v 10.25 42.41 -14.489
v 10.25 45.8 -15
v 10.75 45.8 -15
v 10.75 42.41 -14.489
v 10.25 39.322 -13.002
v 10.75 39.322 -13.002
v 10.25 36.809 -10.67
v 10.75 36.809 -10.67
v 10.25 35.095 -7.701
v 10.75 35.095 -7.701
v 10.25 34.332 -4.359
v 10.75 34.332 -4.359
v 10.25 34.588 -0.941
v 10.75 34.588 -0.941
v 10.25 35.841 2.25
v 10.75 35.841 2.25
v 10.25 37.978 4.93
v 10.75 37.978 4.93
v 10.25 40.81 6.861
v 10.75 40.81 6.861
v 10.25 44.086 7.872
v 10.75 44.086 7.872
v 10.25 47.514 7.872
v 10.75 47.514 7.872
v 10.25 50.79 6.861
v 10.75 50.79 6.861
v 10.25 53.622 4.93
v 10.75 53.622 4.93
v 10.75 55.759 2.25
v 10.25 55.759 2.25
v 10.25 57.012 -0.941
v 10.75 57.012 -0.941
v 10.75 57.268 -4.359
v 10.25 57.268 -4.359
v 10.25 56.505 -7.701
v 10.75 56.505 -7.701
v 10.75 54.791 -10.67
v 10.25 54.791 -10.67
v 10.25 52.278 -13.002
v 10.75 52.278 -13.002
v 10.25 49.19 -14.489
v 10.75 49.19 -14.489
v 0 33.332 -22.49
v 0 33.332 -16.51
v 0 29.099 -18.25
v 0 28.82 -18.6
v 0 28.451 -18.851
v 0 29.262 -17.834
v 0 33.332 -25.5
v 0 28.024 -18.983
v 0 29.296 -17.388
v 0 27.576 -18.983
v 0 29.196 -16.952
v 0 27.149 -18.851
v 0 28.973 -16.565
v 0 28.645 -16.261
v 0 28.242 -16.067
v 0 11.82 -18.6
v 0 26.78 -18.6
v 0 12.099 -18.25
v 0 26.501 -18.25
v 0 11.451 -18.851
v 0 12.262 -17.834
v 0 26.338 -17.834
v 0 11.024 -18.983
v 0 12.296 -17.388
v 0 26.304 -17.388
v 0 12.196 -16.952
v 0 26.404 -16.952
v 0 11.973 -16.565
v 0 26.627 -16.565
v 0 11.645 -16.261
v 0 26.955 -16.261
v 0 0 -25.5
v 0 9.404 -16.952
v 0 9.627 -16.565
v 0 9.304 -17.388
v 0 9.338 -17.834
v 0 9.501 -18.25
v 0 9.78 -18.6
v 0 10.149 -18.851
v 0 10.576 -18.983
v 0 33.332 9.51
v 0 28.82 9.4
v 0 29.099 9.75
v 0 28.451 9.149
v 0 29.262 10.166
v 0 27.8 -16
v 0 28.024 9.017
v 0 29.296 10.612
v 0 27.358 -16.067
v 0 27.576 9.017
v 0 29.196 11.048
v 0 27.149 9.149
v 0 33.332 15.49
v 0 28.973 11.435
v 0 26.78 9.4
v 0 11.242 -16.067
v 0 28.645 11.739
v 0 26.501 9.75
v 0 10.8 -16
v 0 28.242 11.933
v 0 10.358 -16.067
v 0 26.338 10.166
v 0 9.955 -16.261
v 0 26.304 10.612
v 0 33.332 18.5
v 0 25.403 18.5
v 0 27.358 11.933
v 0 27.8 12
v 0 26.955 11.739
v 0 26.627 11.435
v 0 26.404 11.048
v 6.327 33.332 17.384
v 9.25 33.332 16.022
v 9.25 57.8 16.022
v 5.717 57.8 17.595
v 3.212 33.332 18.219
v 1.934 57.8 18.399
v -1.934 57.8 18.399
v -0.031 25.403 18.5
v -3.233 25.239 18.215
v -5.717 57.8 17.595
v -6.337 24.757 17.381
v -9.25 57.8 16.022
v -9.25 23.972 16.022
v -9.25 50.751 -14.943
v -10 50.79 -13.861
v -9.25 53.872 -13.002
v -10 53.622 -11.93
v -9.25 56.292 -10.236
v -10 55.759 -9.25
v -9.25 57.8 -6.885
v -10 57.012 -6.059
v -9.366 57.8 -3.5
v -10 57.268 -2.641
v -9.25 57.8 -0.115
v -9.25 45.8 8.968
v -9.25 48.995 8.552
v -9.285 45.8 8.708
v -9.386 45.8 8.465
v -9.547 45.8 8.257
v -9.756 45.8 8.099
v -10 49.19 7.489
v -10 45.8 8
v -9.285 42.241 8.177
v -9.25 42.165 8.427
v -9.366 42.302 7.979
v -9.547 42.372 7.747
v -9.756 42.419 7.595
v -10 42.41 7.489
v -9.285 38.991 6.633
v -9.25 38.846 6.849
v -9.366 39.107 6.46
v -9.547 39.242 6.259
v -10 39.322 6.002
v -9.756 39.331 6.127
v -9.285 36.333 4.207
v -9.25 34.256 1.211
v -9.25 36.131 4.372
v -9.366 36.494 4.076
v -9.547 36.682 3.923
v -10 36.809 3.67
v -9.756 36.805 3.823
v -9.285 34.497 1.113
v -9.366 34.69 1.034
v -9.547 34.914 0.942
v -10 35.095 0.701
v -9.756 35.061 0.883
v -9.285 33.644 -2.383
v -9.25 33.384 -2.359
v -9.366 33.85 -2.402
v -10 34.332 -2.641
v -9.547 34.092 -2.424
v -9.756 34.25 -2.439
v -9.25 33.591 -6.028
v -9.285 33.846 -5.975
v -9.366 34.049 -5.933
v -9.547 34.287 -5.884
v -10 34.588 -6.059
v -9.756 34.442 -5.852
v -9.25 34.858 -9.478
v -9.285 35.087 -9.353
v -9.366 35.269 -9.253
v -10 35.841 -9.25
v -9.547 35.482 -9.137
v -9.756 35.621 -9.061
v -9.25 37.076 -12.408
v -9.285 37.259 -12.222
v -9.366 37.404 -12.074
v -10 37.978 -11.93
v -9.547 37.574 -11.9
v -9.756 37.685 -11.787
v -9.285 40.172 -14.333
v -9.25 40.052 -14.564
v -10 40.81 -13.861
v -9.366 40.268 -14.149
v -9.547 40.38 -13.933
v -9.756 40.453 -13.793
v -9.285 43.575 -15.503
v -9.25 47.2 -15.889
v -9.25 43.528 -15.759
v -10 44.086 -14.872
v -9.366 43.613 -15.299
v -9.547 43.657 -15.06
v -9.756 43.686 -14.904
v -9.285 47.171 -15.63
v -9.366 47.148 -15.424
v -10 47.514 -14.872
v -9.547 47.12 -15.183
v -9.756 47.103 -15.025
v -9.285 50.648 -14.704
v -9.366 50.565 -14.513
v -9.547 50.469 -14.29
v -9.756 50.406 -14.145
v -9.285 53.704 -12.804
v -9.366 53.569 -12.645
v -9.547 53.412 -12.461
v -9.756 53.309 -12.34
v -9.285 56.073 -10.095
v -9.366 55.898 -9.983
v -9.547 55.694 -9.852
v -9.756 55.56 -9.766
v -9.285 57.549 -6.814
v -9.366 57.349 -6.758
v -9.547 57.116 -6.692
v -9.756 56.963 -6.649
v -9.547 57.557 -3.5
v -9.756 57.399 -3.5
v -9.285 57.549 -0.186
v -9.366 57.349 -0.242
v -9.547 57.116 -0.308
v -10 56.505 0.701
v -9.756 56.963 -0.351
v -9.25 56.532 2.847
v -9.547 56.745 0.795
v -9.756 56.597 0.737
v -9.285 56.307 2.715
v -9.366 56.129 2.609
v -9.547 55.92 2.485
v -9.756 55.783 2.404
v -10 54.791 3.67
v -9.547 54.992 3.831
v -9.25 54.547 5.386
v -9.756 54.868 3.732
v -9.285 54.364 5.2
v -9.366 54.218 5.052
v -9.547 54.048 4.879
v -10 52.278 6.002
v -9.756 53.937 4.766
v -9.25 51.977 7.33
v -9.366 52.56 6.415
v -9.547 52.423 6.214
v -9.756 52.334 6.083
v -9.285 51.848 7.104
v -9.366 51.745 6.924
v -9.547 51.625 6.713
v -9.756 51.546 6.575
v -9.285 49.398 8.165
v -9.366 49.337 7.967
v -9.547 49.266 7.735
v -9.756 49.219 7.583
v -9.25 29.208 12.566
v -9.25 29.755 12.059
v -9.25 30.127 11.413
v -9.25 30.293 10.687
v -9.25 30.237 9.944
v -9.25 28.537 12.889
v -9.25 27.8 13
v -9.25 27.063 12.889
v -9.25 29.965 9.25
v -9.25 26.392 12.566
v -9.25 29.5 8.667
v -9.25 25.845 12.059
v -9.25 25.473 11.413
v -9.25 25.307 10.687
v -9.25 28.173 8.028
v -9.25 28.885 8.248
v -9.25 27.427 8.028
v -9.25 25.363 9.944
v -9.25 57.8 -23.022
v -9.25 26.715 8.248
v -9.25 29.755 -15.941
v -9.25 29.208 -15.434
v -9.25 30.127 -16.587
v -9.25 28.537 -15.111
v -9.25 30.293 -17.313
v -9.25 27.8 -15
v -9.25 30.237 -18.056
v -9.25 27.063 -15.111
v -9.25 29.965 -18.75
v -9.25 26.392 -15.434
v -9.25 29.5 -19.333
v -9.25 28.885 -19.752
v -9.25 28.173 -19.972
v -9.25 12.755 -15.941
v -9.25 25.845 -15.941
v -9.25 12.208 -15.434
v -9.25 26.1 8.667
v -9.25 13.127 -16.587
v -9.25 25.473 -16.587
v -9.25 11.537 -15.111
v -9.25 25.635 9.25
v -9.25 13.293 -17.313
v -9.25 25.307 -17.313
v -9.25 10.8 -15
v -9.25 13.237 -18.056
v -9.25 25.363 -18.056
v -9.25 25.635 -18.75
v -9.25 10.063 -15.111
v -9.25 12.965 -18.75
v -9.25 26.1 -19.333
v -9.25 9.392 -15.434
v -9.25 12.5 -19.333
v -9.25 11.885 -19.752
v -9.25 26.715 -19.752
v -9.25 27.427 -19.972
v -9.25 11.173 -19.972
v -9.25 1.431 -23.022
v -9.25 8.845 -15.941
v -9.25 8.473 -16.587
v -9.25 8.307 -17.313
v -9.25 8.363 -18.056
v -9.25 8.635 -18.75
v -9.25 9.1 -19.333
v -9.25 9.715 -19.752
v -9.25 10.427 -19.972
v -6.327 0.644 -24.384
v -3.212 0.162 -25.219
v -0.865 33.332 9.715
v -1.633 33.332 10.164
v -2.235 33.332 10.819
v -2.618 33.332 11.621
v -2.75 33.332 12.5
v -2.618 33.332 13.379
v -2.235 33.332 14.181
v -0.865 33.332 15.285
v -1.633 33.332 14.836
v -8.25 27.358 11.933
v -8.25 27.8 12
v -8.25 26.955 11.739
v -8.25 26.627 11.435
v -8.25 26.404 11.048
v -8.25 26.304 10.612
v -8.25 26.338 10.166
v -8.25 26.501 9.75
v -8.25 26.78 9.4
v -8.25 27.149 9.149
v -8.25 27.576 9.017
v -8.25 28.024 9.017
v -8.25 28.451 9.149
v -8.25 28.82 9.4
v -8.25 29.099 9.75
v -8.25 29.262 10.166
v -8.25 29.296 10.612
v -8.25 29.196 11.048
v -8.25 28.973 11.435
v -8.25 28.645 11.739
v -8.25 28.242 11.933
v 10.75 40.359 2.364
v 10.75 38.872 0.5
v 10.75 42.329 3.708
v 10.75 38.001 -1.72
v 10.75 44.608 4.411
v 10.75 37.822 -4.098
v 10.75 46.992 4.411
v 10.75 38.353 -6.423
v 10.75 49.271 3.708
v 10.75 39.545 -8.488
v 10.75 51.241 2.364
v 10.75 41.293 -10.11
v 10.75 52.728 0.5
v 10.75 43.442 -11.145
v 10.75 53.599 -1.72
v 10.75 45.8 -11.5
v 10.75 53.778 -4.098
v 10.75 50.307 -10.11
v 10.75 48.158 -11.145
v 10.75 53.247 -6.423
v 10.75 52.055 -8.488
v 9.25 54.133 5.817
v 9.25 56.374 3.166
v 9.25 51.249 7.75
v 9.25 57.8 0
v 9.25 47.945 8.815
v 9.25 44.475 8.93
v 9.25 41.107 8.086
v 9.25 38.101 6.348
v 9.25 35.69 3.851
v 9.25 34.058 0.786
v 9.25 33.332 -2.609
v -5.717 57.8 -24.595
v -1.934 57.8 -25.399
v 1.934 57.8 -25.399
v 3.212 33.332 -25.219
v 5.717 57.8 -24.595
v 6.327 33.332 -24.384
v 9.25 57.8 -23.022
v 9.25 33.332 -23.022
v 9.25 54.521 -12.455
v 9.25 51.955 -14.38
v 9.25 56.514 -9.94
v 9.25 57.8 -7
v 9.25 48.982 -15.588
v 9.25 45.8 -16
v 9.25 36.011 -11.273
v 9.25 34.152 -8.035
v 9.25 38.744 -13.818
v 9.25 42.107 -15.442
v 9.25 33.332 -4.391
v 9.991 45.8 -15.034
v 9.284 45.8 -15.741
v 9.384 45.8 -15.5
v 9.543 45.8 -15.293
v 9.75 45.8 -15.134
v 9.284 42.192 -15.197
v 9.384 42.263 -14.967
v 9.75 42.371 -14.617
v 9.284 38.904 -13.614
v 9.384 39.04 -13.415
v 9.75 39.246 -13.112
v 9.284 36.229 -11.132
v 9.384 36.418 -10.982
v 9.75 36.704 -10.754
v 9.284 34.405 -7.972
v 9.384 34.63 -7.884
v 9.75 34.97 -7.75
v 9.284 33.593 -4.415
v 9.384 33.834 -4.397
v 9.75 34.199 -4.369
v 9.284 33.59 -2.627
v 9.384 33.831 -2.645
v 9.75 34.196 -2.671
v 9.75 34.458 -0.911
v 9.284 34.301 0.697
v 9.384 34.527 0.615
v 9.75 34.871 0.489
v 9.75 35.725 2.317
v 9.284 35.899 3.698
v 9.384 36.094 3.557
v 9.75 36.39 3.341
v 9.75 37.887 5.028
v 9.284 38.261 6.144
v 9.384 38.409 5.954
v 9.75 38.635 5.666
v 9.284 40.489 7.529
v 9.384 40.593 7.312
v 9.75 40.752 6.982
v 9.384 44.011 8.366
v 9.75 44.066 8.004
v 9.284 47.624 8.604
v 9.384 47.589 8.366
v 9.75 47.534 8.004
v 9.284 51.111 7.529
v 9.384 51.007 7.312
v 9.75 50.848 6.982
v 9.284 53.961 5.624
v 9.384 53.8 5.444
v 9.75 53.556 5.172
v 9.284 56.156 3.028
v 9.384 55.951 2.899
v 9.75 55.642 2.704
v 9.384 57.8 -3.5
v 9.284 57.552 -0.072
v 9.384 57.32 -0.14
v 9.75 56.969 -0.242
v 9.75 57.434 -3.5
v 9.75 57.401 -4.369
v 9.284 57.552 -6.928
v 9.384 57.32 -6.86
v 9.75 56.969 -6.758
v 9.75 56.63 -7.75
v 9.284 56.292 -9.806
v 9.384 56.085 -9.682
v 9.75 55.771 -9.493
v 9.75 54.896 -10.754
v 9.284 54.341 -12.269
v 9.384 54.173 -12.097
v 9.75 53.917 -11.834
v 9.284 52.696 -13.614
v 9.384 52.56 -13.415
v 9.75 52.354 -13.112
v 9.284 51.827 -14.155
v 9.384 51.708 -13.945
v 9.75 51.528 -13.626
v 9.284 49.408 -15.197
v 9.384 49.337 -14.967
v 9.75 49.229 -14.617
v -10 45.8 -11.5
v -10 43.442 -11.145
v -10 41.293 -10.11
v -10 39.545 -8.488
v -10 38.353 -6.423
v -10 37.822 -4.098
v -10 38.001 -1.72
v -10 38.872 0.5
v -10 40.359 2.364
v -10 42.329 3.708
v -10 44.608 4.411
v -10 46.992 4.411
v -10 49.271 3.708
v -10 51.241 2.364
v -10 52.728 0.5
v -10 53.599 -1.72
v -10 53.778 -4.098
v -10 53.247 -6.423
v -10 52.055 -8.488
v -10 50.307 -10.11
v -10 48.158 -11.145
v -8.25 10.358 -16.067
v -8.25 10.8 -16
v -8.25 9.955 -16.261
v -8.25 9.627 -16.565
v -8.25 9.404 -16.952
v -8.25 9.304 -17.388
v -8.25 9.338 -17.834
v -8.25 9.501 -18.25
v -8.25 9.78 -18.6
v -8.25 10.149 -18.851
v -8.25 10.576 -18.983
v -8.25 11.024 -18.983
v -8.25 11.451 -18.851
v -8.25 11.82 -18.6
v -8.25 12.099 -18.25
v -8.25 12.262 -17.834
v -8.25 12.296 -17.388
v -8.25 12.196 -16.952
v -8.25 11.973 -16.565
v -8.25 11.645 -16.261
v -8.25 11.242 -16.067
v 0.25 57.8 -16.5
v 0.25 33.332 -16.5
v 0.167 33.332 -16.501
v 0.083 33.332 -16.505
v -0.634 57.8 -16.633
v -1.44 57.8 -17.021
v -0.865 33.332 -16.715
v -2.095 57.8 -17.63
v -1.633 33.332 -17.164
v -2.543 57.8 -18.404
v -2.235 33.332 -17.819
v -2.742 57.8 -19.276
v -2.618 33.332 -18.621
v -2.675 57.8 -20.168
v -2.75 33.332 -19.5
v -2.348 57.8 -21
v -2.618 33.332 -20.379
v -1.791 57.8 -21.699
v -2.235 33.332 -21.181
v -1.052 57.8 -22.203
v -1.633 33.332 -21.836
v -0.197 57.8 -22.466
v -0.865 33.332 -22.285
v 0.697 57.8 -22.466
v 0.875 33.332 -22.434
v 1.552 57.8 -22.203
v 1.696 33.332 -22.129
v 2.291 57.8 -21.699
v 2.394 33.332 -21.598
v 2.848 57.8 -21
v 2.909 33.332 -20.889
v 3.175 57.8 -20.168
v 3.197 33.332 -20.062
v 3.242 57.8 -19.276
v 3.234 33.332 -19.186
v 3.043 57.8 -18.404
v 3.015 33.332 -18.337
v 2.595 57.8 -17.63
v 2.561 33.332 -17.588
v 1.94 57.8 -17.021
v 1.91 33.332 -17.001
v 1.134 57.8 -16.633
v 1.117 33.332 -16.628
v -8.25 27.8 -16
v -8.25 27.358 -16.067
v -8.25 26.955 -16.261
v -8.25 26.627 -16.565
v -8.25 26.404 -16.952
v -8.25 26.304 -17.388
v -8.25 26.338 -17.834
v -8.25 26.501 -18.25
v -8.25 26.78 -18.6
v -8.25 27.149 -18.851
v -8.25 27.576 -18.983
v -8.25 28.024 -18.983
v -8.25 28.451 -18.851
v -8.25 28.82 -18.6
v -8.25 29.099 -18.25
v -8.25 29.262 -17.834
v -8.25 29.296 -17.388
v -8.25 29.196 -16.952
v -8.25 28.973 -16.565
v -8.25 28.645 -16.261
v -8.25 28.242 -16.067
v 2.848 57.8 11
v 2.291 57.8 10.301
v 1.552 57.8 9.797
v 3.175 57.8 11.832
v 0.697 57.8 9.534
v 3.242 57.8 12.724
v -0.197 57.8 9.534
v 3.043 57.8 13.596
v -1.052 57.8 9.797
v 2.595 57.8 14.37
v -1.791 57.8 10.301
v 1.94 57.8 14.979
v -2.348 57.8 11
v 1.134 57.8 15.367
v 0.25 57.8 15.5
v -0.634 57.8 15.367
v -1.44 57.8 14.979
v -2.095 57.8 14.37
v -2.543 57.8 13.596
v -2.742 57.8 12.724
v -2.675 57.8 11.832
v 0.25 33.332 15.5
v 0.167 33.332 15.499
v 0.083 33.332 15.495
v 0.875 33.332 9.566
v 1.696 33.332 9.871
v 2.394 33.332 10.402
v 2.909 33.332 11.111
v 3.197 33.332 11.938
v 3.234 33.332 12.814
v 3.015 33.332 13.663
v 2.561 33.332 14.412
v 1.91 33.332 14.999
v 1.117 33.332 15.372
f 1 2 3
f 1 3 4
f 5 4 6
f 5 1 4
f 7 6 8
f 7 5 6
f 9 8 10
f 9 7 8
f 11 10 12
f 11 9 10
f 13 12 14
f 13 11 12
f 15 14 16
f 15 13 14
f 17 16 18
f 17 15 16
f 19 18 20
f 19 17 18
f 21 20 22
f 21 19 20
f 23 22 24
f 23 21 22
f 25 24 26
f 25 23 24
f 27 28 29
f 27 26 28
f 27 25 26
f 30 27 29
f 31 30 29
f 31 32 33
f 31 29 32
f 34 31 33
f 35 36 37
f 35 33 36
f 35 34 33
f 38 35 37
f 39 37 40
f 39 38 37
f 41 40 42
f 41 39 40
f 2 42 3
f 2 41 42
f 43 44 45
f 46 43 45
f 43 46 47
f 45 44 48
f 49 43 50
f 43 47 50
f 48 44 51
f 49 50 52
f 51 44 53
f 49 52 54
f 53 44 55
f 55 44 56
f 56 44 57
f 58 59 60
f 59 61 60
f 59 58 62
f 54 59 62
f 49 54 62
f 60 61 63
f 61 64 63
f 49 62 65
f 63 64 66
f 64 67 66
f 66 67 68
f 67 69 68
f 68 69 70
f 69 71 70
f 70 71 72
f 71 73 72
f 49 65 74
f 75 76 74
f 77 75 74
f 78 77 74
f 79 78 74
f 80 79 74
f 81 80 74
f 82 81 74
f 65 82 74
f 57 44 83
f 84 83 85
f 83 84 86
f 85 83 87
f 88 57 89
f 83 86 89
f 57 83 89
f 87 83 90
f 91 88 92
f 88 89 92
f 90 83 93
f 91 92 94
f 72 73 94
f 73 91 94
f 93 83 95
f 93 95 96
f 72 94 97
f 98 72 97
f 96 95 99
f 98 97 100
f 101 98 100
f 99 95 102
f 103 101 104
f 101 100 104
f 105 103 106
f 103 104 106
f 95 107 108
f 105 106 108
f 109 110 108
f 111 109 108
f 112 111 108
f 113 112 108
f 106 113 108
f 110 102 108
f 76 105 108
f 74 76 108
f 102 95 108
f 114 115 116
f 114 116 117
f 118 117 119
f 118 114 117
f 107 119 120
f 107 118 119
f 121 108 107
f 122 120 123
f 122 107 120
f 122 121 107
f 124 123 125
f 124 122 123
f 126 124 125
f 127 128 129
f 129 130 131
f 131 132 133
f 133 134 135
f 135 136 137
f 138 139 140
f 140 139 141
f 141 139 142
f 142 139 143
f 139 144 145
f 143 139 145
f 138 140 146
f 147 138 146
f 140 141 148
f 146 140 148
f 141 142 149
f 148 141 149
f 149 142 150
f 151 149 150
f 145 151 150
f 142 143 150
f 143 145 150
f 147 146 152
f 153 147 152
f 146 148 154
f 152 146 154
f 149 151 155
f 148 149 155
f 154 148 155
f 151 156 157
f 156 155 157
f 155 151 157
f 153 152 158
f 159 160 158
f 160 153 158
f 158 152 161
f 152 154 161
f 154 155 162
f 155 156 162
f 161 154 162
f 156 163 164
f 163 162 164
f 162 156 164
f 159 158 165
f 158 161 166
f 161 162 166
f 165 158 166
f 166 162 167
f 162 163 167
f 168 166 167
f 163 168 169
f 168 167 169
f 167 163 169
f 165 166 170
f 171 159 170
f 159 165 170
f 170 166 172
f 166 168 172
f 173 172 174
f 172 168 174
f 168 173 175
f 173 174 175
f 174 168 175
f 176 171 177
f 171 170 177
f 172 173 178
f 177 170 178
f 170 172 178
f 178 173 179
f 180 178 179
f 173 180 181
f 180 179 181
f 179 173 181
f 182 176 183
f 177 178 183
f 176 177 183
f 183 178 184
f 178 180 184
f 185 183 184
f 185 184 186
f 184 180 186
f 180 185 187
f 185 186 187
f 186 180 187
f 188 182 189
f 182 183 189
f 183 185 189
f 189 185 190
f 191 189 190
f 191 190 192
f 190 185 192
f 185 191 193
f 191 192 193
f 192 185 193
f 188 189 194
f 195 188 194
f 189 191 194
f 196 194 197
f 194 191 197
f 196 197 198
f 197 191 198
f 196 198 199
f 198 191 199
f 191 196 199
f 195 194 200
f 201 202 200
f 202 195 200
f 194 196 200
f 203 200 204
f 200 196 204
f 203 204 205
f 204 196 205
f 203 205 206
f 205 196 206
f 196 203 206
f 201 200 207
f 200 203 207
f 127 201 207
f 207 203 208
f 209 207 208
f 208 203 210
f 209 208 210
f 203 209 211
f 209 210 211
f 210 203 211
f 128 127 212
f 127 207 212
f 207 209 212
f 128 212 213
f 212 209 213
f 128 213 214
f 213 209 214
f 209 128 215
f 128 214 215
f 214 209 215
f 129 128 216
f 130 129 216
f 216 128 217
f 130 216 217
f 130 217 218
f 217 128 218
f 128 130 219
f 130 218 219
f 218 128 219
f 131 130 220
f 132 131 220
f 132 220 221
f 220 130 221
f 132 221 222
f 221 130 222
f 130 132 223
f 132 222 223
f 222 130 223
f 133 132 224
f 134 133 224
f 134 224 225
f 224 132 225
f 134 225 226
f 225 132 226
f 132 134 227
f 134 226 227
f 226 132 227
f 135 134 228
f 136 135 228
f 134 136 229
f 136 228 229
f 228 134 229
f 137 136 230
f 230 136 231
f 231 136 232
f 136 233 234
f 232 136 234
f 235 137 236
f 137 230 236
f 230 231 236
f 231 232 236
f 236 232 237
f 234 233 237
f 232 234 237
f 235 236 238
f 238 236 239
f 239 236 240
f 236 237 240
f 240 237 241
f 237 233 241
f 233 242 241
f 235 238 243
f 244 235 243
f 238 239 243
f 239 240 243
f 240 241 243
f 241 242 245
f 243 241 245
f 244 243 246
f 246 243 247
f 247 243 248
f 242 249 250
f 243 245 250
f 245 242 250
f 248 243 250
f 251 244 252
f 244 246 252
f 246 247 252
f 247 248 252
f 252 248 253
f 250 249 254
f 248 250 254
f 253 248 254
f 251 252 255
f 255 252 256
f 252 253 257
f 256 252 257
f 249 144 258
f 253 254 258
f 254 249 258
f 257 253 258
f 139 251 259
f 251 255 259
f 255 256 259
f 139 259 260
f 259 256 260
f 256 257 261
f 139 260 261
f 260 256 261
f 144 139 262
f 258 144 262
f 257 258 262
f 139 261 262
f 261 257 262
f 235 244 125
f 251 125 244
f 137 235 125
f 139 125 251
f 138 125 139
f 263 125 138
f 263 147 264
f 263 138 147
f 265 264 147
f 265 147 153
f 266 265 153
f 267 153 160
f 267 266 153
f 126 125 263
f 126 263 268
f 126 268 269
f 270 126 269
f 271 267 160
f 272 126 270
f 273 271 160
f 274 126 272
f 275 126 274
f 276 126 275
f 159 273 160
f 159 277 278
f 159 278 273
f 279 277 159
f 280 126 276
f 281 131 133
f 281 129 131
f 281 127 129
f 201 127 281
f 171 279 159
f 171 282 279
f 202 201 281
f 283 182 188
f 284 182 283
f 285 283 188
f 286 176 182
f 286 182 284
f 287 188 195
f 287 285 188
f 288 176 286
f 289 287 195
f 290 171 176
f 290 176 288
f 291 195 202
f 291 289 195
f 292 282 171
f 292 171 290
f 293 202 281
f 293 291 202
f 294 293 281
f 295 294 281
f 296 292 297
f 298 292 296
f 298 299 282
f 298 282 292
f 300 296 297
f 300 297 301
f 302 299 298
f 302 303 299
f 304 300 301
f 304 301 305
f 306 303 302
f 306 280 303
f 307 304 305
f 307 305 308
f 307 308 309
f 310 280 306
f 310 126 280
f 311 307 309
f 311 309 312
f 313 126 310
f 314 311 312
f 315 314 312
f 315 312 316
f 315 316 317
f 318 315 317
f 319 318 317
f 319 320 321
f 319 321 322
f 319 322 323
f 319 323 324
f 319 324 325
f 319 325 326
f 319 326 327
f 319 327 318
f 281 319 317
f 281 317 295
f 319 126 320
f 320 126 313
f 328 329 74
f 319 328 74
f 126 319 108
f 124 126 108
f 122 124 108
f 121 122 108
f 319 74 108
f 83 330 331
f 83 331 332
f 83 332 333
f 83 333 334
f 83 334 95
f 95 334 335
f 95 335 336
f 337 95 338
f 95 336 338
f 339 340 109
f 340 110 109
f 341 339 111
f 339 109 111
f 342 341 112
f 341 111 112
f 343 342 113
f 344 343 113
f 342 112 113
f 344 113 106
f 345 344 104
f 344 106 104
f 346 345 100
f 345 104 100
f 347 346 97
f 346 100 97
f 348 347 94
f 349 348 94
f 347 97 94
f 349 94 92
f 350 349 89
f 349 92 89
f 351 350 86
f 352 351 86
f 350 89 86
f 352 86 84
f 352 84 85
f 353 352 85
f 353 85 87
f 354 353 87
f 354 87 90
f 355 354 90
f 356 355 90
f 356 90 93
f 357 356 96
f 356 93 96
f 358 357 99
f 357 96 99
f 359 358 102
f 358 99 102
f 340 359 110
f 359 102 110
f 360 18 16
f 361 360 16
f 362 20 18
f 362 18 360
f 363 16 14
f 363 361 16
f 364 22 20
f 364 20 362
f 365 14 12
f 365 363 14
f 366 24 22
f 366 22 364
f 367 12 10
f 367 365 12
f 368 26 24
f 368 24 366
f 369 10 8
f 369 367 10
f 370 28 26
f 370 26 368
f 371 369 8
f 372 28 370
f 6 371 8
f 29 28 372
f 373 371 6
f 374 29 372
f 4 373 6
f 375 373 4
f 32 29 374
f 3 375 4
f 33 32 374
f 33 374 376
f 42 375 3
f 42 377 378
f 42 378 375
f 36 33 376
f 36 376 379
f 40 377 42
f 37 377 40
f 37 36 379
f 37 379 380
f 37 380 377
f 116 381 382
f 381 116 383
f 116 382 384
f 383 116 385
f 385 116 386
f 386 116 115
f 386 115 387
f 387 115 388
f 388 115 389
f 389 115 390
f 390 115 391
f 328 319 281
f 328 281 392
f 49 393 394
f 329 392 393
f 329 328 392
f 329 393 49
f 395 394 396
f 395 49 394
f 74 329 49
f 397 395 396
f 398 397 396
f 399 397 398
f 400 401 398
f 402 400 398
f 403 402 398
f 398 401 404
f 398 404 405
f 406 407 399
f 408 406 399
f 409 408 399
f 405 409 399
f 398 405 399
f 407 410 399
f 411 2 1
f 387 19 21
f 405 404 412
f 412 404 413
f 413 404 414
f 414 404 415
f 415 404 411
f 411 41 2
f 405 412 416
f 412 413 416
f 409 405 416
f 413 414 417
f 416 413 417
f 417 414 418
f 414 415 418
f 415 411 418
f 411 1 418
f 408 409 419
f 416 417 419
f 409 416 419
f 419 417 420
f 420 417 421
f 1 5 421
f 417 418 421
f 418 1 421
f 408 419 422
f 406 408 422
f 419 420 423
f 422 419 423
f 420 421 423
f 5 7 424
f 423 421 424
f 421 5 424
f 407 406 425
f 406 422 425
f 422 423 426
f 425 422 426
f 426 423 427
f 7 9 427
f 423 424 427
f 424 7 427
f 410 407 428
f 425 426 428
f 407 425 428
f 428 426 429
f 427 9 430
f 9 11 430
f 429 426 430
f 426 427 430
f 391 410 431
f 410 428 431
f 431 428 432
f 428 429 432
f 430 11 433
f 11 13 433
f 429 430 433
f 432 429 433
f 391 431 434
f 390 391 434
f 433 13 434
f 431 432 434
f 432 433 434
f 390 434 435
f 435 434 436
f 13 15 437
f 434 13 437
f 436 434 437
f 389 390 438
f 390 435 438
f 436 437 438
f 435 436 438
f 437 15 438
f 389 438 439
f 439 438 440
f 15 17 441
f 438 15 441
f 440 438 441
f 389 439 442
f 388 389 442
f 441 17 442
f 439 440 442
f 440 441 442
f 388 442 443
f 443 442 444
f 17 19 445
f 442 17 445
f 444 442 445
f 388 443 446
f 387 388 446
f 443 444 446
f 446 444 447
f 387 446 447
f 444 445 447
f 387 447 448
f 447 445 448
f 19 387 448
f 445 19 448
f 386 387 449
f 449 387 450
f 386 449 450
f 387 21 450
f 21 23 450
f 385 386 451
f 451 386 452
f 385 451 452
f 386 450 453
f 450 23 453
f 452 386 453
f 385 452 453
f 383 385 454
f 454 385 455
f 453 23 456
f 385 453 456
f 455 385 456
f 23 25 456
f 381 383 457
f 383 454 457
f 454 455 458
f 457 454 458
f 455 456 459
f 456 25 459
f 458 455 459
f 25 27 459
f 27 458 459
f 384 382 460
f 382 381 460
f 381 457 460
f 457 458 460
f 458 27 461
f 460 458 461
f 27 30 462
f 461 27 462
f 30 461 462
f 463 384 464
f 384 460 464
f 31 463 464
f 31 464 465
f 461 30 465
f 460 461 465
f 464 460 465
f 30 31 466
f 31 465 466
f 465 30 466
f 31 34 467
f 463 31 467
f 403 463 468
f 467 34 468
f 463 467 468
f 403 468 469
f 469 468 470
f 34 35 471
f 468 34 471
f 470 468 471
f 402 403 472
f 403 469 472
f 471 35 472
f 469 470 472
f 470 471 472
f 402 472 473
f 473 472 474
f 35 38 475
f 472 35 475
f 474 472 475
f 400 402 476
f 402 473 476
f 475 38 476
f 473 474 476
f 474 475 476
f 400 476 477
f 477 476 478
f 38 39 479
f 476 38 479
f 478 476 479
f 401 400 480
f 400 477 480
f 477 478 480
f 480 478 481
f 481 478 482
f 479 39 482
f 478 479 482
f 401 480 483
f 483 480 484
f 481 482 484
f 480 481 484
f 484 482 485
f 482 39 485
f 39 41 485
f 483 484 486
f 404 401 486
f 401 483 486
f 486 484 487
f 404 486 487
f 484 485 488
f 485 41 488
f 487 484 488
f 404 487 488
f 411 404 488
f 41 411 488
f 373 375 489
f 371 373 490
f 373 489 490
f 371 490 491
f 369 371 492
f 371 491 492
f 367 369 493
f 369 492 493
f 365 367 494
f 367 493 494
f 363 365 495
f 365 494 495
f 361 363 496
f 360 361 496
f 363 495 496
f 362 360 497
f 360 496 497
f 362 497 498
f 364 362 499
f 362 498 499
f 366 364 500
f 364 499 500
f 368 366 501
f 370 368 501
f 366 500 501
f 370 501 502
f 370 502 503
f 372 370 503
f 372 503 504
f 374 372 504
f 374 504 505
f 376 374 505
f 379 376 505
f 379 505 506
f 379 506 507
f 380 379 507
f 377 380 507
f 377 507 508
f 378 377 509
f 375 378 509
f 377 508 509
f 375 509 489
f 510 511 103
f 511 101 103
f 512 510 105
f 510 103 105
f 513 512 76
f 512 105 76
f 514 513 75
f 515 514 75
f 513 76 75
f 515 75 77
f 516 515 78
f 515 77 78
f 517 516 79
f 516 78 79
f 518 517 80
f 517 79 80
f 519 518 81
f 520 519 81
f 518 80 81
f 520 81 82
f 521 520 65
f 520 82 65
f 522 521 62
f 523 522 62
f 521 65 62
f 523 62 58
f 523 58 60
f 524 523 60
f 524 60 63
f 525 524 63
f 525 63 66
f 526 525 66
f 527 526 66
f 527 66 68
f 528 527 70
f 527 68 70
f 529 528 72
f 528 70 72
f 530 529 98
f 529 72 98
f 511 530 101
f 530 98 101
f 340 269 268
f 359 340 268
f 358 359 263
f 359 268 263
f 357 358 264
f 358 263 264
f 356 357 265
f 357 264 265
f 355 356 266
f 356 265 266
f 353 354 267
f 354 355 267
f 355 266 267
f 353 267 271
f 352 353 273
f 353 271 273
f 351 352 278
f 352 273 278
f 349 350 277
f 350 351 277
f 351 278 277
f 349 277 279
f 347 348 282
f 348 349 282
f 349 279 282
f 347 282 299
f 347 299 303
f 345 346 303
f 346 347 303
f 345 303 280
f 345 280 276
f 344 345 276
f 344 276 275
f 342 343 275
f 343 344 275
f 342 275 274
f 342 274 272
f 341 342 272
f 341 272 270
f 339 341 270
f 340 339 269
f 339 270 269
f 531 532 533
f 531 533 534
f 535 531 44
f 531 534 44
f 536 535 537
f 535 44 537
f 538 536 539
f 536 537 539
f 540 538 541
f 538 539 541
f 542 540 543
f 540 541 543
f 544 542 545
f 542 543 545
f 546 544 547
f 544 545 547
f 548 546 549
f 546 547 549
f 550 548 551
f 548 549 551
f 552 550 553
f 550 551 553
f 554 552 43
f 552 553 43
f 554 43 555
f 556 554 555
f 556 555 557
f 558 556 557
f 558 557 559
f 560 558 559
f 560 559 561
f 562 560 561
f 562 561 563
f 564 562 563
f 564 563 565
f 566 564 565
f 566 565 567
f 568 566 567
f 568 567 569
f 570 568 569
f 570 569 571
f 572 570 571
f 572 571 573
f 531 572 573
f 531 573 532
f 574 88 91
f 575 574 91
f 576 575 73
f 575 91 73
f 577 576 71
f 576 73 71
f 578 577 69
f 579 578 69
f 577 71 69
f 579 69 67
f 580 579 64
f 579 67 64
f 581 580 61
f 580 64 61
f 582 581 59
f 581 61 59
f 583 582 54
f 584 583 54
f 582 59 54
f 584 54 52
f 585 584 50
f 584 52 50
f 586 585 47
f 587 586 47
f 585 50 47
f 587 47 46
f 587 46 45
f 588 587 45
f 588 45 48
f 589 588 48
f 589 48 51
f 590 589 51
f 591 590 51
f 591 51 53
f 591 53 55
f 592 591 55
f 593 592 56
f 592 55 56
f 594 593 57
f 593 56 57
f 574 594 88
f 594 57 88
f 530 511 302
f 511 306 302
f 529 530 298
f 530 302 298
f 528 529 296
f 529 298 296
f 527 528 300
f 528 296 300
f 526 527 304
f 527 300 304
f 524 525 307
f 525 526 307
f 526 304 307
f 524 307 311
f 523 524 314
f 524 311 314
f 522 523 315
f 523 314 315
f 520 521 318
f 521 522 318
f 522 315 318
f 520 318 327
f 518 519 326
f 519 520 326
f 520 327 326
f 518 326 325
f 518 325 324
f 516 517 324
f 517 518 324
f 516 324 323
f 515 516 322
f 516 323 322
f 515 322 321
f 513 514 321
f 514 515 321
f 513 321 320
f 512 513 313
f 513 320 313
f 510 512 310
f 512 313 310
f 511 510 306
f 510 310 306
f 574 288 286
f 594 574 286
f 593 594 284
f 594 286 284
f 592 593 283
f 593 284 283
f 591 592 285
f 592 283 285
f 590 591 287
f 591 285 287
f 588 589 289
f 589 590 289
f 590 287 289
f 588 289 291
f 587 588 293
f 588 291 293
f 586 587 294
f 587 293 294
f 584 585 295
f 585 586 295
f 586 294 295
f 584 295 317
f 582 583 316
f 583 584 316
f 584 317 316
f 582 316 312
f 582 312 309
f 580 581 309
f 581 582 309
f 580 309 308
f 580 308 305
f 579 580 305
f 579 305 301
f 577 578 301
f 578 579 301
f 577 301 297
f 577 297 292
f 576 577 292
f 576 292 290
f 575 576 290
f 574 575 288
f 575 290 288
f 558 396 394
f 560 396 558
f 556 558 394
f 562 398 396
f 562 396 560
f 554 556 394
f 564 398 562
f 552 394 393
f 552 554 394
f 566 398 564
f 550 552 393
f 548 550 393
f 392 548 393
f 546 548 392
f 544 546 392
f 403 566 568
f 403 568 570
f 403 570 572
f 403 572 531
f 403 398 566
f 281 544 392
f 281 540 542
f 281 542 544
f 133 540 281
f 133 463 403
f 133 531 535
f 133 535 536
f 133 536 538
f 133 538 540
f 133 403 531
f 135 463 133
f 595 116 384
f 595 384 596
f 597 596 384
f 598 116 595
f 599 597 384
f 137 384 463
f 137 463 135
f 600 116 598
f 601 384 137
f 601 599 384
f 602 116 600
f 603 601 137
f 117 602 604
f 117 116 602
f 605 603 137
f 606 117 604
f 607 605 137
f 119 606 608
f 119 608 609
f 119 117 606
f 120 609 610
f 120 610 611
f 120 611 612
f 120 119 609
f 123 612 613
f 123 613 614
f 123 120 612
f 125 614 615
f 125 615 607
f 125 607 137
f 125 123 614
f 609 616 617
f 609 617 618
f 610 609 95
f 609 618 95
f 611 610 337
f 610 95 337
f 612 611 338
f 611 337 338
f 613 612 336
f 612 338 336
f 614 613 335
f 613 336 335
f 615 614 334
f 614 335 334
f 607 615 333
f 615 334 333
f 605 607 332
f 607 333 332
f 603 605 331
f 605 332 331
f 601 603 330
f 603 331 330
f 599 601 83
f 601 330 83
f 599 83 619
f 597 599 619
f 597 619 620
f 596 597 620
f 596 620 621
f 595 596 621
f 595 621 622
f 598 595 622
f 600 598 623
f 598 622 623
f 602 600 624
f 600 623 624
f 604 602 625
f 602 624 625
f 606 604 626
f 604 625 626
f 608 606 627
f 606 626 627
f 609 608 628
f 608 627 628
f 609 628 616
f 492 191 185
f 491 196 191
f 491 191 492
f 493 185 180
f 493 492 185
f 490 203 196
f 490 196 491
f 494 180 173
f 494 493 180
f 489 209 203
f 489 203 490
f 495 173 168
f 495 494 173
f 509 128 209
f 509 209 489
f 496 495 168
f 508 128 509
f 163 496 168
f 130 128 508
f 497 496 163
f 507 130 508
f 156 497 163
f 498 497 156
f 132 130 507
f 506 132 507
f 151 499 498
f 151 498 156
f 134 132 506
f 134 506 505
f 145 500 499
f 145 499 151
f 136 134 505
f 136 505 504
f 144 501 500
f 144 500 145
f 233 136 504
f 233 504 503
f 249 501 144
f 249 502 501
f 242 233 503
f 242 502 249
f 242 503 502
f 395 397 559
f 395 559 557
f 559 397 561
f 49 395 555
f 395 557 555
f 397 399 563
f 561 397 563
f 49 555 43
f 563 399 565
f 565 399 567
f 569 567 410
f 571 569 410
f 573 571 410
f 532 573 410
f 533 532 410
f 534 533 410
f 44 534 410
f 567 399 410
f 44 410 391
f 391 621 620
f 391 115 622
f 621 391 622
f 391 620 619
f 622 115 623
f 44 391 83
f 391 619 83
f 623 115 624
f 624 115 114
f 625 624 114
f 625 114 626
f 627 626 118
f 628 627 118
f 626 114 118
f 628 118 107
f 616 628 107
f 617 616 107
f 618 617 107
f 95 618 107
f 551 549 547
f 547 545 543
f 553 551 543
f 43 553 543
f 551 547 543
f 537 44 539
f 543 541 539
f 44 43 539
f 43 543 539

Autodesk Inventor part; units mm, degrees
sketch "Skizze1" plane through (0, 0, 0) normal (0, 1, 0) x (-1, 0, 0)
  line L0 (9.25, 16.0215) -> (9.25, -23.0215)
  line L1 (-9.25, 16.0215) -> (-9.25, -23.0215)
  arc A0 (-9.25, -23.0215) -> (9.25, -23.0215) centre (0, -7) ccw
  arc A1 (9.25, 16.0215) -> (-9.25, 16.0215) centre (0, 0) ccw
  line L2 (9.25, -3.5) -> (-9.25, -3.5) construction
  line L3 (0, 18.5) -> (0, -26.5698) construction
  point P0 (0, -25.5)
  dimension "d1" = 18.5
  dimension "d2" = 44
  dimension "d3" = 18.5
extrude "Extrusion1" add sketch "Skizze1" along normal blind 57.8
sketch "Skizze2" plane through (9.25, 0, 16.0215) normal (1, 0, 0) x (0, 0, -1)
  line L0 (0, 0) -> (-2.4785, 0) projected
  line L1 (41.5215, 0) -> (41.5215, 57.8) projected
  line L2 (0, 0) -> (39.0429, 0) projected
  line L3 (41.5215, 0) -> (39.0429, 0) projected
  line L4 (-2.4785, 0) -> (-2.4785, 57.8) projected
  line L5 (41.5215, 0) -> (-2.4785, 25.4034)
  point P0 (16.0215, 0)
  dimension "d143" = 60
extrude "Extrusion2" cut sketch "Skizze2" against normal up to surface (18.5 mm away)
ref_plane "Arbeitsebene1" through (0, 45.8, 0) normal (0, 1, 0) x (-1, 0, 0)
sketch "Skizze8" plane through (-9.25, 57.8, -23.0215) normal (-1, 0, 0) x (0, 0, 1)
  circle A0 centre (19.5215, -12) radius 11.5
  line L0 (0, 0) -> (39.0429, 0) projected
  point P0 (23.0215, -57.8)
  point P1 (19.5215, 0)
  dimension "d40" = 23
  dimension "d41" = 12
extrude "Extrusion5" add sketch "Skizze8" along normal mid plane 1.5
sketch "Skizze9" plane through (9.25, 57.8, 16.0215) normal (1, 0, 0) x (0, 0, -1)
  circle A0 centre (19.5215, -12) radius 11.5
  line L0 (0, 0) -> (39.0429, 0) projected
  point P0 (16.0215, -57.8)
  point P1 (19.5215, 0)
  dimension "d44" = 23
  dimension "d45" = 12
extrude "Extrusion6" add sketch "Skizze9" along normal blind 1.5
sketch "Skizze10" plane through (10.75, 45.8, -3.5) normal (1, 0, 0) x (0, 0, -1)
  circle A0 centre (0, 0) radius 11.5 projected
  point P0 (-3.5, -45.8)
hole "Bohrung4" at (10.75, 45.8, -3.5) direction (-1, 0, 0) diameter 16 depth 20.75
ref_plane "Arbeitsebene2" through (0, 45.8, 0) normal (0, 1, 0) x (-1, 0, 0)
split_face "Trennen2"
sketch "Skizze11" plane through (0, 57.8, 0) normal (0, 1, 0) x (1, 0, 0)
  line L0 (0, 0) -> (5.4139, 0) construction
  arc A0 (-9.25, -16.0215) -> (9.25, -16.0215) centre (0, 0) ccw projected
  line L1 (0, -18.5) -> (0, 25.5) construction
  arc A1 (9.25, 23.0215) -> (-9.25, 23.0215) centre (0, 7) ccw projected
  point P0 (0, -12.5)
  point P1 (0, 19.5)
  point P2 (0, 3.5)
  dimension "d67" = 16
  dimension "d68" = 32
ref_plane "Arbeitsebene3" through (0, 0, 0) normal (1, 0, 0) x (0, 1, 0)
fillet "Rundung1" radius 1 2 edges at (9.25, 45.8, 8) (-9.25, 45.8, -15)
sketch "Skizze17" plane through (0, 0, 0) normal (1, 0, 0) x (0, 1, 0)
  line L0 (0, -25.5) -> (45.8, -25.5) projected
  arc A0 (45.8, -11.5) -> (45.8, 4.5) centre (45.8, -3.5) ccw projected
  arc A1 (45.8, 4.5) -> (45.8, -11.5) centre (45.8, -3.5) ccw projected
  arc A2 (45.8, 4.5) -> (45.8, -11.5) centre (45.8, -3.5) ccw projected
  line L1 (57.8, -0.1152) -> (57.8, 16.0215) projected
  point P0 (0, 0)
  point P1 (68.19, 2.5)
  dimension "d112" = 10.39
  dimension "d113" = 6
ref_plane "Arbeitsebene8" through (0, 0, 19) normal (0, 0, 1) x (1, 0, 0)
sketch "Skizze22" plane through (0, 0, 19) normal (0, 0, 1) x (1, 0, 0)
  line L0 (-9.25, 45.8) -> (-9.25, 33.3318) projected
  line L1 (0, 0) -> (9.5, 0)
  line L2 (9.5, 0) -> (9.5, 33.3318)
  line L3 (9.5, 33.3318) -> (0, 33.3318)
  line L4 (0, 33.3318) -> (0, 0)
  dimension "d125" = 9.5
extrude "Extrusion8" cut sketch "Skizze22" against normal through all
sketch "Skizze25" plane through (-9.25, 1.431, -23.0215) normal (-1, 0, 0) x (0, 0, 1)
  line L0 (-2.4785, 31.9008) -> (-2.4785, -1.431) projected
  arc A0 (11.5215, 44.369) -> (27.5215, 44.369) centre (19.5215, 44.369) ccw projected
  arc A1 (27.5215, 44.369) -> (11.5215, 44.369) centre (19.5215, 44.369) ccw projected
  point P0 (23.0215, -1.431)
  point P1 (5.5215, 9.369)
  point P2 (5.5215, 26.369)
  point P3 (33.5215, 26.369)
  dimension "d144" = 10.8
  dimension "d145" = 14
  dimension "d146" = 17
  dimension "d147" = 14
hole "Bohrung11" at (-9.25, 10.8, -17.5) at (-9.25, 27.8, -17.5) at (-9.25, 27.8, 10.5) direction (1, 0, 0) diameter 3 depth 9.25 countersink diameter 5 countersink angle 90
sketch "Skizze26" plane through (0, 57.8, 0) normal (0, 1, 0) x (1, 0, 0)
  line L0 (0, 25.5) -> (0, -18.5) projected
  line L1 (-9.25, 23.0215) -> (-9.25, 6.8848) projected
  line L2 (-9.25, 0.1152) -> (-9.25, -16.0215) projected
  line L3 (9.25, 7) -> (9.25, 23.0215) projected
  line L4 (9.25, -16.0215) -> (9.25, 0) projected
  arc A0 (9.25, 23.0215) -> (-9.25, 23.0215) centre (0, 7) ccw projected
  arc A1 (-9.25, -16.0215) -> (9.25, -16.0215) centre (0, 0) ccw projected
  point P0 (0.25, 19.5)
  point P1 (0.25, -12.5)
  point P2 (0, 25.5)
  point P3 (0, -18.5)
  dimension "d155" = 9.5
  dimension "d156" = 9.5
  dimension "d157" = 6
  dimension "d158" = 6
hole "Bohrung12" at (0.25, 57.8, 12.5) at (0.25, 57.8, -19.5) direction (0, -1, 0) diameter 6 depth 24.4682
properties part number "1042"
